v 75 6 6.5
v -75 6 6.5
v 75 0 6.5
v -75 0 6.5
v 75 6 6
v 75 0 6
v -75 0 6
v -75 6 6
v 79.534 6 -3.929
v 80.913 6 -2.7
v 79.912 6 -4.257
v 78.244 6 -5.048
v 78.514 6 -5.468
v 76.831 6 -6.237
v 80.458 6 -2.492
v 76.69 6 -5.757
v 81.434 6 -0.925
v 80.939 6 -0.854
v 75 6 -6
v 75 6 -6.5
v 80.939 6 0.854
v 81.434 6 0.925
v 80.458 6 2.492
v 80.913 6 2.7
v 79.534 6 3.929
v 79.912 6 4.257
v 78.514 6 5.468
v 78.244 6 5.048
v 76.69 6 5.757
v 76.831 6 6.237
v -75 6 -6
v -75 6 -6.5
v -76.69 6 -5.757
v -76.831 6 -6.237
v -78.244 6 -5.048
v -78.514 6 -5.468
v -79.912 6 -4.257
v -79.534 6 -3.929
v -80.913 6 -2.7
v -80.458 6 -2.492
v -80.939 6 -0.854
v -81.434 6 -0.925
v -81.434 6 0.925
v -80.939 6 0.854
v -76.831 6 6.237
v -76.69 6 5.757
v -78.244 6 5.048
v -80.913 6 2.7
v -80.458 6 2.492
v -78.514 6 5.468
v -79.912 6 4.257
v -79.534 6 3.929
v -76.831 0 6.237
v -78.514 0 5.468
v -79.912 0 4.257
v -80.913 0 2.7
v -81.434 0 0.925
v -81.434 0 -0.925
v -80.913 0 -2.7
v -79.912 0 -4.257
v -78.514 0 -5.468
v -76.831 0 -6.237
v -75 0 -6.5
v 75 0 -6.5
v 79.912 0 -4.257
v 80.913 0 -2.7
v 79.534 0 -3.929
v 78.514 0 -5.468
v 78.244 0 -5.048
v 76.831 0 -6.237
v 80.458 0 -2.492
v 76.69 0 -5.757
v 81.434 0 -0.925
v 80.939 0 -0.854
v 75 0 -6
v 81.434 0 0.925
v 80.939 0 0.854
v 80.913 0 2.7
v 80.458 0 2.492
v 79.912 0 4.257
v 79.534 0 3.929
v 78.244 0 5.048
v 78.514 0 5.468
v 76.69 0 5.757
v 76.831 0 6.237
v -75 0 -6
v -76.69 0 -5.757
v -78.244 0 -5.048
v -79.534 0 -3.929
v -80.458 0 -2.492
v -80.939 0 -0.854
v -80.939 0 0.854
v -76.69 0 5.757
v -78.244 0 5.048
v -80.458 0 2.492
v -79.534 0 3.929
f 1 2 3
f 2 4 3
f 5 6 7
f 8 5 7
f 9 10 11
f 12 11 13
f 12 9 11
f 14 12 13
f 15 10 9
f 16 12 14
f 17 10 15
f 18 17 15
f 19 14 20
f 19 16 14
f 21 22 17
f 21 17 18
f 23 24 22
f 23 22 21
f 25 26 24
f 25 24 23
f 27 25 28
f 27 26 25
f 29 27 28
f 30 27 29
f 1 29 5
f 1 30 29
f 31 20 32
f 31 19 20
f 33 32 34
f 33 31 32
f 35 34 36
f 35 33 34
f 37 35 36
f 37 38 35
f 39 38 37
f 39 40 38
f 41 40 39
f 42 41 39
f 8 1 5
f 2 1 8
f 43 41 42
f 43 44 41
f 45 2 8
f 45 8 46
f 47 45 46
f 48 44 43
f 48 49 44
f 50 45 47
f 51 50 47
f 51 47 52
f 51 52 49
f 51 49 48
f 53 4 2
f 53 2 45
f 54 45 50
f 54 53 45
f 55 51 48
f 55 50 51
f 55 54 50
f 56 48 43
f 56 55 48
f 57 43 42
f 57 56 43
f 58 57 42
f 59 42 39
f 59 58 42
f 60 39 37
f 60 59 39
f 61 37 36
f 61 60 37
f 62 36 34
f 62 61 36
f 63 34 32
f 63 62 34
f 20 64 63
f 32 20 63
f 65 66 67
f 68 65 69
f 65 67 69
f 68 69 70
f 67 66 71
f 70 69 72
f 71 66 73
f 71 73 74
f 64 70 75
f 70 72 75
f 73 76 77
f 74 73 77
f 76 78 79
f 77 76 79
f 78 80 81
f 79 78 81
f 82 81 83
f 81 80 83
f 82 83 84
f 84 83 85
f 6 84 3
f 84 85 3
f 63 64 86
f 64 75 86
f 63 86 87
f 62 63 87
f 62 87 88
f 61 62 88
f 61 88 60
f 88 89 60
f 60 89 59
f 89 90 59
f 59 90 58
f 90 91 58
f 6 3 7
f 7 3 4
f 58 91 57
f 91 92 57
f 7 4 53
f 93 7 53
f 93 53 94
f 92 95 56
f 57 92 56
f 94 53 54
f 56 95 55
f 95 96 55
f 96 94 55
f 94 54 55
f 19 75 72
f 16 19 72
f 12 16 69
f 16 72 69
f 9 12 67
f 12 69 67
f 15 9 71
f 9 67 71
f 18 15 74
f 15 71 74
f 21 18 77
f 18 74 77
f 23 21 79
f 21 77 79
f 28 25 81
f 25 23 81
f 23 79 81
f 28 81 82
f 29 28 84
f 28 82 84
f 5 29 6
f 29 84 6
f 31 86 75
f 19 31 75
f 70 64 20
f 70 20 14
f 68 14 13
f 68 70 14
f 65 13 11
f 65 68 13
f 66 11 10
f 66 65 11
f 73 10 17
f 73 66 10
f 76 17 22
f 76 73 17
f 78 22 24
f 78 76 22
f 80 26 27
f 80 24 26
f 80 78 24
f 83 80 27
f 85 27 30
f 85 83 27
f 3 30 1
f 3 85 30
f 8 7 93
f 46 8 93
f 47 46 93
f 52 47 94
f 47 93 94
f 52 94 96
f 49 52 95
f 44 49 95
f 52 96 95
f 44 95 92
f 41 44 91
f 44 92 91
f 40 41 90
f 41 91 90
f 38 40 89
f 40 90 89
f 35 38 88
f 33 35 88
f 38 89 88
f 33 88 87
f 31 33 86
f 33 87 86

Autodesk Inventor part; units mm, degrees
ref_plane "YZ Plane" through (0, 0, 0) normal (1, 0, 0) x (0, 1, 0)
ref_plane "XZ Plane" through (0, 0, 0) normal (0, 1, 0) x (-1, 0, 0)
ref_plane "XY Plane" through (0, 0, 0) normal (0, 0, 1) x (1, 0, 0)
sketch "スケッチ1" plane through (0, 0, 0) normal (0, 1, 0) x (-1, 0, 0)
  line L0 (75, 6.5) -> (-75, 6.5)
  line L1 (-75, -6.5) -> (75, -6.5)
  line L2 (0, -9.1) -> (0, 9.1) projected
  line L3 (75, 6.5) -> (75, -6.5) construction
  line L4 (-75, 6.5) -> (-75, -6.5) construction
  circle A0 centre (75, 0) radius 6.5
  circle A1 centre (-75, 0) radius 6.5
  circle A2 centre (75, 0) radius 6
  circle A3 centre (-75, 0) radius 6
  line L5 (75, -6) -> (-75, -6)
  line L6 (-75, 6) -> (75, 6)
  point P0 (0, 0)
  point P1 (75, 6.5)
  point P2 (-75, 6.5)
  dimension "d3" = 13
  dimension "d2" = 150
  dimension "d4" = 12
  dimension "d5" = 12
extrude "押し出し1" add sketch "スケッチ1" along normal blind 6 contours A0 L6 L2 L0 | A0 L5 A2 L6 | L2 L6 A1 L0 | A1 L6 A3 L5 | L1 L2 L5 A0 | A1 L5 L2 L1 picked at (80.8664, -2.29) picked at (-77.4549, -5.7931)
properties part number "belt"
